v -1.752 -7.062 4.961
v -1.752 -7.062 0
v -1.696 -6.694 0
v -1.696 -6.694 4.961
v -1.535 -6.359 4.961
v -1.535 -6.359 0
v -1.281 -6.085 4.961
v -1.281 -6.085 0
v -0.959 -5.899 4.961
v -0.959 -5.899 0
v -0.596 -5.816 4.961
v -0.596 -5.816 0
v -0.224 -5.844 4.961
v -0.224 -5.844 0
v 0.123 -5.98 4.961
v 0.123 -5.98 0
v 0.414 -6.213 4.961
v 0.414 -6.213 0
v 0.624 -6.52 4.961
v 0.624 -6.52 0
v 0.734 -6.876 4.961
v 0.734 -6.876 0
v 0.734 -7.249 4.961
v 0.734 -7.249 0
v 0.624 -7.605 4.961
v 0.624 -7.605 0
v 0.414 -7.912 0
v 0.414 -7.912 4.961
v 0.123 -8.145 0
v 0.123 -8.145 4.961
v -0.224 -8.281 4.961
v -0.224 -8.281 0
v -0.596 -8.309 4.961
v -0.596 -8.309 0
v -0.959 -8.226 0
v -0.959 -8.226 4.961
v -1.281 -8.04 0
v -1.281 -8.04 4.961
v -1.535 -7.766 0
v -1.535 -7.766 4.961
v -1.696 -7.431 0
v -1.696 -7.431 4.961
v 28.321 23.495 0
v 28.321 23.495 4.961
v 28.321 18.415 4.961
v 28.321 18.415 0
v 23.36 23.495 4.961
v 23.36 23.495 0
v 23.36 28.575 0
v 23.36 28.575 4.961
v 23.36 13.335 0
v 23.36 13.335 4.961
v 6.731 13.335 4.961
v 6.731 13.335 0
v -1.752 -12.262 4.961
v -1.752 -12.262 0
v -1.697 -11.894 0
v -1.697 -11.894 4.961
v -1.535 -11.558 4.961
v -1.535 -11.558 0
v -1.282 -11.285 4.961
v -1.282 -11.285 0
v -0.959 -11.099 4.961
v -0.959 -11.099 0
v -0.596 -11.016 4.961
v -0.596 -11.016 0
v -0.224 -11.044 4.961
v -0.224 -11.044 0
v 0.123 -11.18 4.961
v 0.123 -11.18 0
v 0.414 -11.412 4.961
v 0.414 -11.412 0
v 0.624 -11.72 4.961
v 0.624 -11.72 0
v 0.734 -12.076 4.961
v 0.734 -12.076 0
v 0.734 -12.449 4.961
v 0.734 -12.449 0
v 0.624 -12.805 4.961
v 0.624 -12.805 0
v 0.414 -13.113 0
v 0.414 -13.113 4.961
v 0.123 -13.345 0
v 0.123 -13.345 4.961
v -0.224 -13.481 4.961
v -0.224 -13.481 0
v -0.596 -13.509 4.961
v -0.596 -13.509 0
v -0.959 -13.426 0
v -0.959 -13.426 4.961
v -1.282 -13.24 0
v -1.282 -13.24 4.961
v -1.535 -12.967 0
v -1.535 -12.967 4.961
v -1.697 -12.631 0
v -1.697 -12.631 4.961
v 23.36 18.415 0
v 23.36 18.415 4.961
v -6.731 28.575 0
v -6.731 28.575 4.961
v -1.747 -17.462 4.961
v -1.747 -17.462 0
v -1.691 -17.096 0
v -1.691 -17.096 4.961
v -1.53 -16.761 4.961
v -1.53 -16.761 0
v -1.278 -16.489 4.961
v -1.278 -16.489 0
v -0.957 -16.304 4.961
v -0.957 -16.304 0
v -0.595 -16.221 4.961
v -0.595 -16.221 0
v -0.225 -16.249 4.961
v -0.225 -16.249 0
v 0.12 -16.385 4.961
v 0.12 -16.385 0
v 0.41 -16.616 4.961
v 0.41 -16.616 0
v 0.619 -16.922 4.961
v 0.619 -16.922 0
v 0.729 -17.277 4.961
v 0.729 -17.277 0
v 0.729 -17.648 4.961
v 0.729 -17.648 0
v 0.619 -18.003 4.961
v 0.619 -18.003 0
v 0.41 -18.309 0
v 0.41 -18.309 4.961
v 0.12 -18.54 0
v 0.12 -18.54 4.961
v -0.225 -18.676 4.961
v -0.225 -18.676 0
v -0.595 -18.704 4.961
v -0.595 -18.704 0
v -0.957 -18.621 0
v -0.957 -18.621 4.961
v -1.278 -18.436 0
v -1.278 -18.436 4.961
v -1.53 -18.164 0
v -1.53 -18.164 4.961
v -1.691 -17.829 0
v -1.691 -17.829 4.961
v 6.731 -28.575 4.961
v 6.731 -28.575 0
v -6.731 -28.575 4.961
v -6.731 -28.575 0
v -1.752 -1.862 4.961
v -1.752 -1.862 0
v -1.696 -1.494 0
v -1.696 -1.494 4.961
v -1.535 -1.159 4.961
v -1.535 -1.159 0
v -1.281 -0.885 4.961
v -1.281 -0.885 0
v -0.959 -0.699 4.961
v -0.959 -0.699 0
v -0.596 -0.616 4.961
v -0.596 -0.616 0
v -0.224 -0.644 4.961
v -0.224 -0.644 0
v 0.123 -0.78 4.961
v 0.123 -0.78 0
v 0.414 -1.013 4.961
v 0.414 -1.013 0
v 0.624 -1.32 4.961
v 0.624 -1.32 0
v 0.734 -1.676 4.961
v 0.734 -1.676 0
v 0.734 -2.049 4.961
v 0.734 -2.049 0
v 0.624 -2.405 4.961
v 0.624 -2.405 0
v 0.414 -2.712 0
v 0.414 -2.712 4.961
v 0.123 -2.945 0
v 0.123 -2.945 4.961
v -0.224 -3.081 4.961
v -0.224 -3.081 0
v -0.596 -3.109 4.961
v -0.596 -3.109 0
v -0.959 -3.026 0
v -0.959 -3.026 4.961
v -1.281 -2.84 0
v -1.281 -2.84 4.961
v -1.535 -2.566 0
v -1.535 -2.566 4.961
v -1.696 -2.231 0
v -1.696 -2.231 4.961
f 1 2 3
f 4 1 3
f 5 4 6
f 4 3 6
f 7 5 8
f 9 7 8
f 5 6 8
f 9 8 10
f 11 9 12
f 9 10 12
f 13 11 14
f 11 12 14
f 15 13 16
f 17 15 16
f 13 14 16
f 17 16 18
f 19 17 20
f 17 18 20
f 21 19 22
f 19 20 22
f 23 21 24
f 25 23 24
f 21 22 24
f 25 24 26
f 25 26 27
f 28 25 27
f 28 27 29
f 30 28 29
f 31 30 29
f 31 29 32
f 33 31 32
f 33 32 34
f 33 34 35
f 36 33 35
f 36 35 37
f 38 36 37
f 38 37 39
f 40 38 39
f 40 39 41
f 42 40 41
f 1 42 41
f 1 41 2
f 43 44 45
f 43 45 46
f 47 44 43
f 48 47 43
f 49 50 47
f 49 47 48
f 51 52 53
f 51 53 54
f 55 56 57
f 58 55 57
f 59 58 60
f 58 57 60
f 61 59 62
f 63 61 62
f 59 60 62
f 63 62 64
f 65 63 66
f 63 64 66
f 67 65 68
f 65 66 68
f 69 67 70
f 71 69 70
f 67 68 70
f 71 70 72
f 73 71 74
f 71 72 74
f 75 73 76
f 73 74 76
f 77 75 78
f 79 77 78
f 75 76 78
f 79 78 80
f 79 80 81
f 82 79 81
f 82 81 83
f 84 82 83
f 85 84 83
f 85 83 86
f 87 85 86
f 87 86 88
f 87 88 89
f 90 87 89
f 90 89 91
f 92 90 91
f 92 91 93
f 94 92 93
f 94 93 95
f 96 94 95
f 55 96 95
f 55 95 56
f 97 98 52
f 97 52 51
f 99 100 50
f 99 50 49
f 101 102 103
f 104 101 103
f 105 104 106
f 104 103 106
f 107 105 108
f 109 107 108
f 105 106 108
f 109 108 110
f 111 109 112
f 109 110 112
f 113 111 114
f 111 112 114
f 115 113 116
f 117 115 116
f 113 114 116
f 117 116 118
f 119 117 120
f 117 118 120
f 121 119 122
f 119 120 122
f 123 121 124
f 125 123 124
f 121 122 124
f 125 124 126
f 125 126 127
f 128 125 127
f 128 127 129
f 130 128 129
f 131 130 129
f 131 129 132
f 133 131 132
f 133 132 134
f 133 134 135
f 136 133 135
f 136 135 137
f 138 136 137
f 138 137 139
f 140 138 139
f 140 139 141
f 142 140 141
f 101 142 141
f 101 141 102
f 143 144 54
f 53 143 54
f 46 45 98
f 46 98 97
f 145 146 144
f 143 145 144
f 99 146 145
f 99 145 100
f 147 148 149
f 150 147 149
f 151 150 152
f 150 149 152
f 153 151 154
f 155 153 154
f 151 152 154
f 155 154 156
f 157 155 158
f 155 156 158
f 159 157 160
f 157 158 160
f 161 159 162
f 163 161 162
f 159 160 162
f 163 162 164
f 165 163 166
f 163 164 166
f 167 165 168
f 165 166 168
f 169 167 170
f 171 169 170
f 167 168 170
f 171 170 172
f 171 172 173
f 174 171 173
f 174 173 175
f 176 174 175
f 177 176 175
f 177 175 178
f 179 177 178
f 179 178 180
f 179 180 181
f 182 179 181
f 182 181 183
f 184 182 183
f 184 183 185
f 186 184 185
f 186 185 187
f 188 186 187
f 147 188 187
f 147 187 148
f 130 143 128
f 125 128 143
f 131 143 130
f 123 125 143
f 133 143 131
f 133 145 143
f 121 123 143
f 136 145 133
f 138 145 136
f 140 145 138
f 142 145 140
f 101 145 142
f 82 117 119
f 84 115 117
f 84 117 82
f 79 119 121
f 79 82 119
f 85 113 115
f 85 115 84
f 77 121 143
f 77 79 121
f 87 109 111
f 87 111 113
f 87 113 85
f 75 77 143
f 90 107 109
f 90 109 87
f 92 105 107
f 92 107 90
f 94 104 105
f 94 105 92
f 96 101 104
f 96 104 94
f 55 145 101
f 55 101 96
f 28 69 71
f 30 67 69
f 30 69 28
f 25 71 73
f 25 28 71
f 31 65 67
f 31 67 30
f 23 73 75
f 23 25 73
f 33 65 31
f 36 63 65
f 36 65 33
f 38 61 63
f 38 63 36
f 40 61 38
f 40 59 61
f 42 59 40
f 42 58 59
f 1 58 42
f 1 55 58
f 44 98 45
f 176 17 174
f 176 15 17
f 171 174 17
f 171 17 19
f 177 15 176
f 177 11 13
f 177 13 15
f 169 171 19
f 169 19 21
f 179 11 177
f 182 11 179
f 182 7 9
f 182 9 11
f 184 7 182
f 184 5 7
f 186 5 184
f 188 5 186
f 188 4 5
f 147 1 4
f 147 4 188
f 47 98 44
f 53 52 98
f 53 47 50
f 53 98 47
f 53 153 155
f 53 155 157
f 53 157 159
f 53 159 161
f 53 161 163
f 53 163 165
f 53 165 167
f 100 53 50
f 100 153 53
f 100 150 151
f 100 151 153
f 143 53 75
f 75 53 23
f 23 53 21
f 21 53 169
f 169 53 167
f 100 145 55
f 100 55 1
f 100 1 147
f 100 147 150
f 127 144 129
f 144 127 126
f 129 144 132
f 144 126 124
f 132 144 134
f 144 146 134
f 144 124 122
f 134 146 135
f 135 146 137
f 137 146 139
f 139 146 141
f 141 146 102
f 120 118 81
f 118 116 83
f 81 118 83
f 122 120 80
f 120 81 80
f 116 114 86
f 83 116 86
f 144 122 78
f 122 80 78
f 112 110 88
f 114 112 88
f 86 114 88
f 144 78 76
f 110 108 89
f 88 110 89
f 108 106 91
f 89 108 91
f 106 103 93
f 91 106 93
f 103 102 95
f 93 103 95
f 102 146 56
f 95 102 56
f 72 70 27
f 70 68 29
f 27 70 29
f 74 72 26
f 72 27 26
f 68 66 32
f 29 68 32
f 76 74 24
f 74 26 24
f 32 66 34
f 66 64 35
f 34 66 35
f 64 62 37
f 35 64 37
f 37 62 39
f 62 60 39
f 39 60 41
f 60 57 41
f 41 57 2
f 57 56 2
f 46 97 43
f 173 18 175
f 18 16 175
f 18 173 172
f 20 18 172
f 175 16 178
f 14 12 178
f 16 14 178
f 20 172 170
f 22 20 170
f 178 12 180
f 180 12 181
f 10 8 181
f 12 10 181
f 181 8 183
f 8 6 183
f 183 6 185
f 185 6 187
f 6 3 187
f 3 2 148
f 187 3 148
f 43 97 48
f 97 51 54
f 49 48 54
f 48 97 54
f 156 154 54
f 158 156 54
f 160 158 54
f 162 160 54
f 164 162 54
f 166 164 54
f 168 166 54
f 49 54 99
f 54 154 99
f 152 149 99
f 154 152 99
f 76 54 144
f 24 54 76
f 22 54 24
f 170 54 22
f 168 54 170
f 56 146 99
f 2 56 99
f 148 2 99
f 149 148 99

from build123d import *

# Parameters (mm, degrees)
SKETCH1_W           = 13.462
SKETCH1_H           = 57.15
BOSS_EXTRUDE1_DEPTH = 4.9609375
SKETCH2_W           = 4.9609375
SKETCH2_H           = 15.24
BOSS_EXTRUDE2_DEPTH = 21.59
SKETCH5_R           = 1.2446
SKETCH5_R_2         = 1.25
SKETCH5_R_3         = 1.24968
CUT_EXTRUDE2_DEPTH  = 5.9609375
SKETCH6_OUTSIDE_W   = 20.407
SKETCH6_OUTSIDE_H   = 72.596
SKETCH6_OUTSIDE_W_2 = 4.9609375
SKETCH6_OUTSIDE_H_2 = 5.08
CUT_EXTRUDE3_DEPTH  = 4.9609375


with BuildPart() as part:
    # Sketch1 → Boss-Extrude1 (new body)
    with BuildSketch(Plane.XY):
        Rectangle(SKETCH1_W, SKETCH1_H)
    extrude(amount=BOSS_EXTRUDE1_DEPTH)

    # Sketch2 → Boss-Extrude2 (add)
    with BuildSketch(Plane(origin=(6.731, 0, 0), x_dir=(0, 0, -1), z_dir=(1, 0, 0))):
        with Locations((-2.48046875, 20.955)):
            Rectangle(SKETCH2_W, SKETCH2_H)
    extrude(amount=BOSS_EXTRUDE2_DEPTH)

    # Sketch5 → Cut-Extrude2 (cut, through all)
    with BuildSketch(Plane(origin=(0, 0, 0), x_dir=(-1, 0, 0), z_dir=(0, 0, -1))):
        with Locations((0.502153829, -17.4625)):
            Circle(SKETCH5_R)
        with Locations((0.502153829, -12.2625)):
            Circle(SKETCH5_R_2)
        with Locations((0.502153829, -7.0625)):
            Circle(SKETCH5_R_3)
        with Locations((0.502153829, -1.8625)):
            Circle(SKETCH5_R_3)
    extrude(amount=-CUT_EXTRUDE2_DEPTH, mode=Mode.SUBTRACT)

    # Sketch6 outside → Cut-Extrude3 (cut)
    with BuildSketch(Plane(origin=(28.321, 0, 0), x_dir=(0, 0, -1), z_dir=(1, 0, 0))):
        with Locations((-2.4805, 0)):
            Rectangle(SKETCH6_OUTSIDE_W, SKETCH6_OUTSIDE_H)
        with Locations((-2.48046875, 20.955)):
            Rectangle(SKETCH6_OUTSIDE_W_2, SKETCH6_OUTSIDE_H_2, mode=Mode.SUBTRACT)
    extrude(amount=-CUT_EXTRUDE3_DEPTH, mode=Mode.SUBTRACT)


solid = part.part
